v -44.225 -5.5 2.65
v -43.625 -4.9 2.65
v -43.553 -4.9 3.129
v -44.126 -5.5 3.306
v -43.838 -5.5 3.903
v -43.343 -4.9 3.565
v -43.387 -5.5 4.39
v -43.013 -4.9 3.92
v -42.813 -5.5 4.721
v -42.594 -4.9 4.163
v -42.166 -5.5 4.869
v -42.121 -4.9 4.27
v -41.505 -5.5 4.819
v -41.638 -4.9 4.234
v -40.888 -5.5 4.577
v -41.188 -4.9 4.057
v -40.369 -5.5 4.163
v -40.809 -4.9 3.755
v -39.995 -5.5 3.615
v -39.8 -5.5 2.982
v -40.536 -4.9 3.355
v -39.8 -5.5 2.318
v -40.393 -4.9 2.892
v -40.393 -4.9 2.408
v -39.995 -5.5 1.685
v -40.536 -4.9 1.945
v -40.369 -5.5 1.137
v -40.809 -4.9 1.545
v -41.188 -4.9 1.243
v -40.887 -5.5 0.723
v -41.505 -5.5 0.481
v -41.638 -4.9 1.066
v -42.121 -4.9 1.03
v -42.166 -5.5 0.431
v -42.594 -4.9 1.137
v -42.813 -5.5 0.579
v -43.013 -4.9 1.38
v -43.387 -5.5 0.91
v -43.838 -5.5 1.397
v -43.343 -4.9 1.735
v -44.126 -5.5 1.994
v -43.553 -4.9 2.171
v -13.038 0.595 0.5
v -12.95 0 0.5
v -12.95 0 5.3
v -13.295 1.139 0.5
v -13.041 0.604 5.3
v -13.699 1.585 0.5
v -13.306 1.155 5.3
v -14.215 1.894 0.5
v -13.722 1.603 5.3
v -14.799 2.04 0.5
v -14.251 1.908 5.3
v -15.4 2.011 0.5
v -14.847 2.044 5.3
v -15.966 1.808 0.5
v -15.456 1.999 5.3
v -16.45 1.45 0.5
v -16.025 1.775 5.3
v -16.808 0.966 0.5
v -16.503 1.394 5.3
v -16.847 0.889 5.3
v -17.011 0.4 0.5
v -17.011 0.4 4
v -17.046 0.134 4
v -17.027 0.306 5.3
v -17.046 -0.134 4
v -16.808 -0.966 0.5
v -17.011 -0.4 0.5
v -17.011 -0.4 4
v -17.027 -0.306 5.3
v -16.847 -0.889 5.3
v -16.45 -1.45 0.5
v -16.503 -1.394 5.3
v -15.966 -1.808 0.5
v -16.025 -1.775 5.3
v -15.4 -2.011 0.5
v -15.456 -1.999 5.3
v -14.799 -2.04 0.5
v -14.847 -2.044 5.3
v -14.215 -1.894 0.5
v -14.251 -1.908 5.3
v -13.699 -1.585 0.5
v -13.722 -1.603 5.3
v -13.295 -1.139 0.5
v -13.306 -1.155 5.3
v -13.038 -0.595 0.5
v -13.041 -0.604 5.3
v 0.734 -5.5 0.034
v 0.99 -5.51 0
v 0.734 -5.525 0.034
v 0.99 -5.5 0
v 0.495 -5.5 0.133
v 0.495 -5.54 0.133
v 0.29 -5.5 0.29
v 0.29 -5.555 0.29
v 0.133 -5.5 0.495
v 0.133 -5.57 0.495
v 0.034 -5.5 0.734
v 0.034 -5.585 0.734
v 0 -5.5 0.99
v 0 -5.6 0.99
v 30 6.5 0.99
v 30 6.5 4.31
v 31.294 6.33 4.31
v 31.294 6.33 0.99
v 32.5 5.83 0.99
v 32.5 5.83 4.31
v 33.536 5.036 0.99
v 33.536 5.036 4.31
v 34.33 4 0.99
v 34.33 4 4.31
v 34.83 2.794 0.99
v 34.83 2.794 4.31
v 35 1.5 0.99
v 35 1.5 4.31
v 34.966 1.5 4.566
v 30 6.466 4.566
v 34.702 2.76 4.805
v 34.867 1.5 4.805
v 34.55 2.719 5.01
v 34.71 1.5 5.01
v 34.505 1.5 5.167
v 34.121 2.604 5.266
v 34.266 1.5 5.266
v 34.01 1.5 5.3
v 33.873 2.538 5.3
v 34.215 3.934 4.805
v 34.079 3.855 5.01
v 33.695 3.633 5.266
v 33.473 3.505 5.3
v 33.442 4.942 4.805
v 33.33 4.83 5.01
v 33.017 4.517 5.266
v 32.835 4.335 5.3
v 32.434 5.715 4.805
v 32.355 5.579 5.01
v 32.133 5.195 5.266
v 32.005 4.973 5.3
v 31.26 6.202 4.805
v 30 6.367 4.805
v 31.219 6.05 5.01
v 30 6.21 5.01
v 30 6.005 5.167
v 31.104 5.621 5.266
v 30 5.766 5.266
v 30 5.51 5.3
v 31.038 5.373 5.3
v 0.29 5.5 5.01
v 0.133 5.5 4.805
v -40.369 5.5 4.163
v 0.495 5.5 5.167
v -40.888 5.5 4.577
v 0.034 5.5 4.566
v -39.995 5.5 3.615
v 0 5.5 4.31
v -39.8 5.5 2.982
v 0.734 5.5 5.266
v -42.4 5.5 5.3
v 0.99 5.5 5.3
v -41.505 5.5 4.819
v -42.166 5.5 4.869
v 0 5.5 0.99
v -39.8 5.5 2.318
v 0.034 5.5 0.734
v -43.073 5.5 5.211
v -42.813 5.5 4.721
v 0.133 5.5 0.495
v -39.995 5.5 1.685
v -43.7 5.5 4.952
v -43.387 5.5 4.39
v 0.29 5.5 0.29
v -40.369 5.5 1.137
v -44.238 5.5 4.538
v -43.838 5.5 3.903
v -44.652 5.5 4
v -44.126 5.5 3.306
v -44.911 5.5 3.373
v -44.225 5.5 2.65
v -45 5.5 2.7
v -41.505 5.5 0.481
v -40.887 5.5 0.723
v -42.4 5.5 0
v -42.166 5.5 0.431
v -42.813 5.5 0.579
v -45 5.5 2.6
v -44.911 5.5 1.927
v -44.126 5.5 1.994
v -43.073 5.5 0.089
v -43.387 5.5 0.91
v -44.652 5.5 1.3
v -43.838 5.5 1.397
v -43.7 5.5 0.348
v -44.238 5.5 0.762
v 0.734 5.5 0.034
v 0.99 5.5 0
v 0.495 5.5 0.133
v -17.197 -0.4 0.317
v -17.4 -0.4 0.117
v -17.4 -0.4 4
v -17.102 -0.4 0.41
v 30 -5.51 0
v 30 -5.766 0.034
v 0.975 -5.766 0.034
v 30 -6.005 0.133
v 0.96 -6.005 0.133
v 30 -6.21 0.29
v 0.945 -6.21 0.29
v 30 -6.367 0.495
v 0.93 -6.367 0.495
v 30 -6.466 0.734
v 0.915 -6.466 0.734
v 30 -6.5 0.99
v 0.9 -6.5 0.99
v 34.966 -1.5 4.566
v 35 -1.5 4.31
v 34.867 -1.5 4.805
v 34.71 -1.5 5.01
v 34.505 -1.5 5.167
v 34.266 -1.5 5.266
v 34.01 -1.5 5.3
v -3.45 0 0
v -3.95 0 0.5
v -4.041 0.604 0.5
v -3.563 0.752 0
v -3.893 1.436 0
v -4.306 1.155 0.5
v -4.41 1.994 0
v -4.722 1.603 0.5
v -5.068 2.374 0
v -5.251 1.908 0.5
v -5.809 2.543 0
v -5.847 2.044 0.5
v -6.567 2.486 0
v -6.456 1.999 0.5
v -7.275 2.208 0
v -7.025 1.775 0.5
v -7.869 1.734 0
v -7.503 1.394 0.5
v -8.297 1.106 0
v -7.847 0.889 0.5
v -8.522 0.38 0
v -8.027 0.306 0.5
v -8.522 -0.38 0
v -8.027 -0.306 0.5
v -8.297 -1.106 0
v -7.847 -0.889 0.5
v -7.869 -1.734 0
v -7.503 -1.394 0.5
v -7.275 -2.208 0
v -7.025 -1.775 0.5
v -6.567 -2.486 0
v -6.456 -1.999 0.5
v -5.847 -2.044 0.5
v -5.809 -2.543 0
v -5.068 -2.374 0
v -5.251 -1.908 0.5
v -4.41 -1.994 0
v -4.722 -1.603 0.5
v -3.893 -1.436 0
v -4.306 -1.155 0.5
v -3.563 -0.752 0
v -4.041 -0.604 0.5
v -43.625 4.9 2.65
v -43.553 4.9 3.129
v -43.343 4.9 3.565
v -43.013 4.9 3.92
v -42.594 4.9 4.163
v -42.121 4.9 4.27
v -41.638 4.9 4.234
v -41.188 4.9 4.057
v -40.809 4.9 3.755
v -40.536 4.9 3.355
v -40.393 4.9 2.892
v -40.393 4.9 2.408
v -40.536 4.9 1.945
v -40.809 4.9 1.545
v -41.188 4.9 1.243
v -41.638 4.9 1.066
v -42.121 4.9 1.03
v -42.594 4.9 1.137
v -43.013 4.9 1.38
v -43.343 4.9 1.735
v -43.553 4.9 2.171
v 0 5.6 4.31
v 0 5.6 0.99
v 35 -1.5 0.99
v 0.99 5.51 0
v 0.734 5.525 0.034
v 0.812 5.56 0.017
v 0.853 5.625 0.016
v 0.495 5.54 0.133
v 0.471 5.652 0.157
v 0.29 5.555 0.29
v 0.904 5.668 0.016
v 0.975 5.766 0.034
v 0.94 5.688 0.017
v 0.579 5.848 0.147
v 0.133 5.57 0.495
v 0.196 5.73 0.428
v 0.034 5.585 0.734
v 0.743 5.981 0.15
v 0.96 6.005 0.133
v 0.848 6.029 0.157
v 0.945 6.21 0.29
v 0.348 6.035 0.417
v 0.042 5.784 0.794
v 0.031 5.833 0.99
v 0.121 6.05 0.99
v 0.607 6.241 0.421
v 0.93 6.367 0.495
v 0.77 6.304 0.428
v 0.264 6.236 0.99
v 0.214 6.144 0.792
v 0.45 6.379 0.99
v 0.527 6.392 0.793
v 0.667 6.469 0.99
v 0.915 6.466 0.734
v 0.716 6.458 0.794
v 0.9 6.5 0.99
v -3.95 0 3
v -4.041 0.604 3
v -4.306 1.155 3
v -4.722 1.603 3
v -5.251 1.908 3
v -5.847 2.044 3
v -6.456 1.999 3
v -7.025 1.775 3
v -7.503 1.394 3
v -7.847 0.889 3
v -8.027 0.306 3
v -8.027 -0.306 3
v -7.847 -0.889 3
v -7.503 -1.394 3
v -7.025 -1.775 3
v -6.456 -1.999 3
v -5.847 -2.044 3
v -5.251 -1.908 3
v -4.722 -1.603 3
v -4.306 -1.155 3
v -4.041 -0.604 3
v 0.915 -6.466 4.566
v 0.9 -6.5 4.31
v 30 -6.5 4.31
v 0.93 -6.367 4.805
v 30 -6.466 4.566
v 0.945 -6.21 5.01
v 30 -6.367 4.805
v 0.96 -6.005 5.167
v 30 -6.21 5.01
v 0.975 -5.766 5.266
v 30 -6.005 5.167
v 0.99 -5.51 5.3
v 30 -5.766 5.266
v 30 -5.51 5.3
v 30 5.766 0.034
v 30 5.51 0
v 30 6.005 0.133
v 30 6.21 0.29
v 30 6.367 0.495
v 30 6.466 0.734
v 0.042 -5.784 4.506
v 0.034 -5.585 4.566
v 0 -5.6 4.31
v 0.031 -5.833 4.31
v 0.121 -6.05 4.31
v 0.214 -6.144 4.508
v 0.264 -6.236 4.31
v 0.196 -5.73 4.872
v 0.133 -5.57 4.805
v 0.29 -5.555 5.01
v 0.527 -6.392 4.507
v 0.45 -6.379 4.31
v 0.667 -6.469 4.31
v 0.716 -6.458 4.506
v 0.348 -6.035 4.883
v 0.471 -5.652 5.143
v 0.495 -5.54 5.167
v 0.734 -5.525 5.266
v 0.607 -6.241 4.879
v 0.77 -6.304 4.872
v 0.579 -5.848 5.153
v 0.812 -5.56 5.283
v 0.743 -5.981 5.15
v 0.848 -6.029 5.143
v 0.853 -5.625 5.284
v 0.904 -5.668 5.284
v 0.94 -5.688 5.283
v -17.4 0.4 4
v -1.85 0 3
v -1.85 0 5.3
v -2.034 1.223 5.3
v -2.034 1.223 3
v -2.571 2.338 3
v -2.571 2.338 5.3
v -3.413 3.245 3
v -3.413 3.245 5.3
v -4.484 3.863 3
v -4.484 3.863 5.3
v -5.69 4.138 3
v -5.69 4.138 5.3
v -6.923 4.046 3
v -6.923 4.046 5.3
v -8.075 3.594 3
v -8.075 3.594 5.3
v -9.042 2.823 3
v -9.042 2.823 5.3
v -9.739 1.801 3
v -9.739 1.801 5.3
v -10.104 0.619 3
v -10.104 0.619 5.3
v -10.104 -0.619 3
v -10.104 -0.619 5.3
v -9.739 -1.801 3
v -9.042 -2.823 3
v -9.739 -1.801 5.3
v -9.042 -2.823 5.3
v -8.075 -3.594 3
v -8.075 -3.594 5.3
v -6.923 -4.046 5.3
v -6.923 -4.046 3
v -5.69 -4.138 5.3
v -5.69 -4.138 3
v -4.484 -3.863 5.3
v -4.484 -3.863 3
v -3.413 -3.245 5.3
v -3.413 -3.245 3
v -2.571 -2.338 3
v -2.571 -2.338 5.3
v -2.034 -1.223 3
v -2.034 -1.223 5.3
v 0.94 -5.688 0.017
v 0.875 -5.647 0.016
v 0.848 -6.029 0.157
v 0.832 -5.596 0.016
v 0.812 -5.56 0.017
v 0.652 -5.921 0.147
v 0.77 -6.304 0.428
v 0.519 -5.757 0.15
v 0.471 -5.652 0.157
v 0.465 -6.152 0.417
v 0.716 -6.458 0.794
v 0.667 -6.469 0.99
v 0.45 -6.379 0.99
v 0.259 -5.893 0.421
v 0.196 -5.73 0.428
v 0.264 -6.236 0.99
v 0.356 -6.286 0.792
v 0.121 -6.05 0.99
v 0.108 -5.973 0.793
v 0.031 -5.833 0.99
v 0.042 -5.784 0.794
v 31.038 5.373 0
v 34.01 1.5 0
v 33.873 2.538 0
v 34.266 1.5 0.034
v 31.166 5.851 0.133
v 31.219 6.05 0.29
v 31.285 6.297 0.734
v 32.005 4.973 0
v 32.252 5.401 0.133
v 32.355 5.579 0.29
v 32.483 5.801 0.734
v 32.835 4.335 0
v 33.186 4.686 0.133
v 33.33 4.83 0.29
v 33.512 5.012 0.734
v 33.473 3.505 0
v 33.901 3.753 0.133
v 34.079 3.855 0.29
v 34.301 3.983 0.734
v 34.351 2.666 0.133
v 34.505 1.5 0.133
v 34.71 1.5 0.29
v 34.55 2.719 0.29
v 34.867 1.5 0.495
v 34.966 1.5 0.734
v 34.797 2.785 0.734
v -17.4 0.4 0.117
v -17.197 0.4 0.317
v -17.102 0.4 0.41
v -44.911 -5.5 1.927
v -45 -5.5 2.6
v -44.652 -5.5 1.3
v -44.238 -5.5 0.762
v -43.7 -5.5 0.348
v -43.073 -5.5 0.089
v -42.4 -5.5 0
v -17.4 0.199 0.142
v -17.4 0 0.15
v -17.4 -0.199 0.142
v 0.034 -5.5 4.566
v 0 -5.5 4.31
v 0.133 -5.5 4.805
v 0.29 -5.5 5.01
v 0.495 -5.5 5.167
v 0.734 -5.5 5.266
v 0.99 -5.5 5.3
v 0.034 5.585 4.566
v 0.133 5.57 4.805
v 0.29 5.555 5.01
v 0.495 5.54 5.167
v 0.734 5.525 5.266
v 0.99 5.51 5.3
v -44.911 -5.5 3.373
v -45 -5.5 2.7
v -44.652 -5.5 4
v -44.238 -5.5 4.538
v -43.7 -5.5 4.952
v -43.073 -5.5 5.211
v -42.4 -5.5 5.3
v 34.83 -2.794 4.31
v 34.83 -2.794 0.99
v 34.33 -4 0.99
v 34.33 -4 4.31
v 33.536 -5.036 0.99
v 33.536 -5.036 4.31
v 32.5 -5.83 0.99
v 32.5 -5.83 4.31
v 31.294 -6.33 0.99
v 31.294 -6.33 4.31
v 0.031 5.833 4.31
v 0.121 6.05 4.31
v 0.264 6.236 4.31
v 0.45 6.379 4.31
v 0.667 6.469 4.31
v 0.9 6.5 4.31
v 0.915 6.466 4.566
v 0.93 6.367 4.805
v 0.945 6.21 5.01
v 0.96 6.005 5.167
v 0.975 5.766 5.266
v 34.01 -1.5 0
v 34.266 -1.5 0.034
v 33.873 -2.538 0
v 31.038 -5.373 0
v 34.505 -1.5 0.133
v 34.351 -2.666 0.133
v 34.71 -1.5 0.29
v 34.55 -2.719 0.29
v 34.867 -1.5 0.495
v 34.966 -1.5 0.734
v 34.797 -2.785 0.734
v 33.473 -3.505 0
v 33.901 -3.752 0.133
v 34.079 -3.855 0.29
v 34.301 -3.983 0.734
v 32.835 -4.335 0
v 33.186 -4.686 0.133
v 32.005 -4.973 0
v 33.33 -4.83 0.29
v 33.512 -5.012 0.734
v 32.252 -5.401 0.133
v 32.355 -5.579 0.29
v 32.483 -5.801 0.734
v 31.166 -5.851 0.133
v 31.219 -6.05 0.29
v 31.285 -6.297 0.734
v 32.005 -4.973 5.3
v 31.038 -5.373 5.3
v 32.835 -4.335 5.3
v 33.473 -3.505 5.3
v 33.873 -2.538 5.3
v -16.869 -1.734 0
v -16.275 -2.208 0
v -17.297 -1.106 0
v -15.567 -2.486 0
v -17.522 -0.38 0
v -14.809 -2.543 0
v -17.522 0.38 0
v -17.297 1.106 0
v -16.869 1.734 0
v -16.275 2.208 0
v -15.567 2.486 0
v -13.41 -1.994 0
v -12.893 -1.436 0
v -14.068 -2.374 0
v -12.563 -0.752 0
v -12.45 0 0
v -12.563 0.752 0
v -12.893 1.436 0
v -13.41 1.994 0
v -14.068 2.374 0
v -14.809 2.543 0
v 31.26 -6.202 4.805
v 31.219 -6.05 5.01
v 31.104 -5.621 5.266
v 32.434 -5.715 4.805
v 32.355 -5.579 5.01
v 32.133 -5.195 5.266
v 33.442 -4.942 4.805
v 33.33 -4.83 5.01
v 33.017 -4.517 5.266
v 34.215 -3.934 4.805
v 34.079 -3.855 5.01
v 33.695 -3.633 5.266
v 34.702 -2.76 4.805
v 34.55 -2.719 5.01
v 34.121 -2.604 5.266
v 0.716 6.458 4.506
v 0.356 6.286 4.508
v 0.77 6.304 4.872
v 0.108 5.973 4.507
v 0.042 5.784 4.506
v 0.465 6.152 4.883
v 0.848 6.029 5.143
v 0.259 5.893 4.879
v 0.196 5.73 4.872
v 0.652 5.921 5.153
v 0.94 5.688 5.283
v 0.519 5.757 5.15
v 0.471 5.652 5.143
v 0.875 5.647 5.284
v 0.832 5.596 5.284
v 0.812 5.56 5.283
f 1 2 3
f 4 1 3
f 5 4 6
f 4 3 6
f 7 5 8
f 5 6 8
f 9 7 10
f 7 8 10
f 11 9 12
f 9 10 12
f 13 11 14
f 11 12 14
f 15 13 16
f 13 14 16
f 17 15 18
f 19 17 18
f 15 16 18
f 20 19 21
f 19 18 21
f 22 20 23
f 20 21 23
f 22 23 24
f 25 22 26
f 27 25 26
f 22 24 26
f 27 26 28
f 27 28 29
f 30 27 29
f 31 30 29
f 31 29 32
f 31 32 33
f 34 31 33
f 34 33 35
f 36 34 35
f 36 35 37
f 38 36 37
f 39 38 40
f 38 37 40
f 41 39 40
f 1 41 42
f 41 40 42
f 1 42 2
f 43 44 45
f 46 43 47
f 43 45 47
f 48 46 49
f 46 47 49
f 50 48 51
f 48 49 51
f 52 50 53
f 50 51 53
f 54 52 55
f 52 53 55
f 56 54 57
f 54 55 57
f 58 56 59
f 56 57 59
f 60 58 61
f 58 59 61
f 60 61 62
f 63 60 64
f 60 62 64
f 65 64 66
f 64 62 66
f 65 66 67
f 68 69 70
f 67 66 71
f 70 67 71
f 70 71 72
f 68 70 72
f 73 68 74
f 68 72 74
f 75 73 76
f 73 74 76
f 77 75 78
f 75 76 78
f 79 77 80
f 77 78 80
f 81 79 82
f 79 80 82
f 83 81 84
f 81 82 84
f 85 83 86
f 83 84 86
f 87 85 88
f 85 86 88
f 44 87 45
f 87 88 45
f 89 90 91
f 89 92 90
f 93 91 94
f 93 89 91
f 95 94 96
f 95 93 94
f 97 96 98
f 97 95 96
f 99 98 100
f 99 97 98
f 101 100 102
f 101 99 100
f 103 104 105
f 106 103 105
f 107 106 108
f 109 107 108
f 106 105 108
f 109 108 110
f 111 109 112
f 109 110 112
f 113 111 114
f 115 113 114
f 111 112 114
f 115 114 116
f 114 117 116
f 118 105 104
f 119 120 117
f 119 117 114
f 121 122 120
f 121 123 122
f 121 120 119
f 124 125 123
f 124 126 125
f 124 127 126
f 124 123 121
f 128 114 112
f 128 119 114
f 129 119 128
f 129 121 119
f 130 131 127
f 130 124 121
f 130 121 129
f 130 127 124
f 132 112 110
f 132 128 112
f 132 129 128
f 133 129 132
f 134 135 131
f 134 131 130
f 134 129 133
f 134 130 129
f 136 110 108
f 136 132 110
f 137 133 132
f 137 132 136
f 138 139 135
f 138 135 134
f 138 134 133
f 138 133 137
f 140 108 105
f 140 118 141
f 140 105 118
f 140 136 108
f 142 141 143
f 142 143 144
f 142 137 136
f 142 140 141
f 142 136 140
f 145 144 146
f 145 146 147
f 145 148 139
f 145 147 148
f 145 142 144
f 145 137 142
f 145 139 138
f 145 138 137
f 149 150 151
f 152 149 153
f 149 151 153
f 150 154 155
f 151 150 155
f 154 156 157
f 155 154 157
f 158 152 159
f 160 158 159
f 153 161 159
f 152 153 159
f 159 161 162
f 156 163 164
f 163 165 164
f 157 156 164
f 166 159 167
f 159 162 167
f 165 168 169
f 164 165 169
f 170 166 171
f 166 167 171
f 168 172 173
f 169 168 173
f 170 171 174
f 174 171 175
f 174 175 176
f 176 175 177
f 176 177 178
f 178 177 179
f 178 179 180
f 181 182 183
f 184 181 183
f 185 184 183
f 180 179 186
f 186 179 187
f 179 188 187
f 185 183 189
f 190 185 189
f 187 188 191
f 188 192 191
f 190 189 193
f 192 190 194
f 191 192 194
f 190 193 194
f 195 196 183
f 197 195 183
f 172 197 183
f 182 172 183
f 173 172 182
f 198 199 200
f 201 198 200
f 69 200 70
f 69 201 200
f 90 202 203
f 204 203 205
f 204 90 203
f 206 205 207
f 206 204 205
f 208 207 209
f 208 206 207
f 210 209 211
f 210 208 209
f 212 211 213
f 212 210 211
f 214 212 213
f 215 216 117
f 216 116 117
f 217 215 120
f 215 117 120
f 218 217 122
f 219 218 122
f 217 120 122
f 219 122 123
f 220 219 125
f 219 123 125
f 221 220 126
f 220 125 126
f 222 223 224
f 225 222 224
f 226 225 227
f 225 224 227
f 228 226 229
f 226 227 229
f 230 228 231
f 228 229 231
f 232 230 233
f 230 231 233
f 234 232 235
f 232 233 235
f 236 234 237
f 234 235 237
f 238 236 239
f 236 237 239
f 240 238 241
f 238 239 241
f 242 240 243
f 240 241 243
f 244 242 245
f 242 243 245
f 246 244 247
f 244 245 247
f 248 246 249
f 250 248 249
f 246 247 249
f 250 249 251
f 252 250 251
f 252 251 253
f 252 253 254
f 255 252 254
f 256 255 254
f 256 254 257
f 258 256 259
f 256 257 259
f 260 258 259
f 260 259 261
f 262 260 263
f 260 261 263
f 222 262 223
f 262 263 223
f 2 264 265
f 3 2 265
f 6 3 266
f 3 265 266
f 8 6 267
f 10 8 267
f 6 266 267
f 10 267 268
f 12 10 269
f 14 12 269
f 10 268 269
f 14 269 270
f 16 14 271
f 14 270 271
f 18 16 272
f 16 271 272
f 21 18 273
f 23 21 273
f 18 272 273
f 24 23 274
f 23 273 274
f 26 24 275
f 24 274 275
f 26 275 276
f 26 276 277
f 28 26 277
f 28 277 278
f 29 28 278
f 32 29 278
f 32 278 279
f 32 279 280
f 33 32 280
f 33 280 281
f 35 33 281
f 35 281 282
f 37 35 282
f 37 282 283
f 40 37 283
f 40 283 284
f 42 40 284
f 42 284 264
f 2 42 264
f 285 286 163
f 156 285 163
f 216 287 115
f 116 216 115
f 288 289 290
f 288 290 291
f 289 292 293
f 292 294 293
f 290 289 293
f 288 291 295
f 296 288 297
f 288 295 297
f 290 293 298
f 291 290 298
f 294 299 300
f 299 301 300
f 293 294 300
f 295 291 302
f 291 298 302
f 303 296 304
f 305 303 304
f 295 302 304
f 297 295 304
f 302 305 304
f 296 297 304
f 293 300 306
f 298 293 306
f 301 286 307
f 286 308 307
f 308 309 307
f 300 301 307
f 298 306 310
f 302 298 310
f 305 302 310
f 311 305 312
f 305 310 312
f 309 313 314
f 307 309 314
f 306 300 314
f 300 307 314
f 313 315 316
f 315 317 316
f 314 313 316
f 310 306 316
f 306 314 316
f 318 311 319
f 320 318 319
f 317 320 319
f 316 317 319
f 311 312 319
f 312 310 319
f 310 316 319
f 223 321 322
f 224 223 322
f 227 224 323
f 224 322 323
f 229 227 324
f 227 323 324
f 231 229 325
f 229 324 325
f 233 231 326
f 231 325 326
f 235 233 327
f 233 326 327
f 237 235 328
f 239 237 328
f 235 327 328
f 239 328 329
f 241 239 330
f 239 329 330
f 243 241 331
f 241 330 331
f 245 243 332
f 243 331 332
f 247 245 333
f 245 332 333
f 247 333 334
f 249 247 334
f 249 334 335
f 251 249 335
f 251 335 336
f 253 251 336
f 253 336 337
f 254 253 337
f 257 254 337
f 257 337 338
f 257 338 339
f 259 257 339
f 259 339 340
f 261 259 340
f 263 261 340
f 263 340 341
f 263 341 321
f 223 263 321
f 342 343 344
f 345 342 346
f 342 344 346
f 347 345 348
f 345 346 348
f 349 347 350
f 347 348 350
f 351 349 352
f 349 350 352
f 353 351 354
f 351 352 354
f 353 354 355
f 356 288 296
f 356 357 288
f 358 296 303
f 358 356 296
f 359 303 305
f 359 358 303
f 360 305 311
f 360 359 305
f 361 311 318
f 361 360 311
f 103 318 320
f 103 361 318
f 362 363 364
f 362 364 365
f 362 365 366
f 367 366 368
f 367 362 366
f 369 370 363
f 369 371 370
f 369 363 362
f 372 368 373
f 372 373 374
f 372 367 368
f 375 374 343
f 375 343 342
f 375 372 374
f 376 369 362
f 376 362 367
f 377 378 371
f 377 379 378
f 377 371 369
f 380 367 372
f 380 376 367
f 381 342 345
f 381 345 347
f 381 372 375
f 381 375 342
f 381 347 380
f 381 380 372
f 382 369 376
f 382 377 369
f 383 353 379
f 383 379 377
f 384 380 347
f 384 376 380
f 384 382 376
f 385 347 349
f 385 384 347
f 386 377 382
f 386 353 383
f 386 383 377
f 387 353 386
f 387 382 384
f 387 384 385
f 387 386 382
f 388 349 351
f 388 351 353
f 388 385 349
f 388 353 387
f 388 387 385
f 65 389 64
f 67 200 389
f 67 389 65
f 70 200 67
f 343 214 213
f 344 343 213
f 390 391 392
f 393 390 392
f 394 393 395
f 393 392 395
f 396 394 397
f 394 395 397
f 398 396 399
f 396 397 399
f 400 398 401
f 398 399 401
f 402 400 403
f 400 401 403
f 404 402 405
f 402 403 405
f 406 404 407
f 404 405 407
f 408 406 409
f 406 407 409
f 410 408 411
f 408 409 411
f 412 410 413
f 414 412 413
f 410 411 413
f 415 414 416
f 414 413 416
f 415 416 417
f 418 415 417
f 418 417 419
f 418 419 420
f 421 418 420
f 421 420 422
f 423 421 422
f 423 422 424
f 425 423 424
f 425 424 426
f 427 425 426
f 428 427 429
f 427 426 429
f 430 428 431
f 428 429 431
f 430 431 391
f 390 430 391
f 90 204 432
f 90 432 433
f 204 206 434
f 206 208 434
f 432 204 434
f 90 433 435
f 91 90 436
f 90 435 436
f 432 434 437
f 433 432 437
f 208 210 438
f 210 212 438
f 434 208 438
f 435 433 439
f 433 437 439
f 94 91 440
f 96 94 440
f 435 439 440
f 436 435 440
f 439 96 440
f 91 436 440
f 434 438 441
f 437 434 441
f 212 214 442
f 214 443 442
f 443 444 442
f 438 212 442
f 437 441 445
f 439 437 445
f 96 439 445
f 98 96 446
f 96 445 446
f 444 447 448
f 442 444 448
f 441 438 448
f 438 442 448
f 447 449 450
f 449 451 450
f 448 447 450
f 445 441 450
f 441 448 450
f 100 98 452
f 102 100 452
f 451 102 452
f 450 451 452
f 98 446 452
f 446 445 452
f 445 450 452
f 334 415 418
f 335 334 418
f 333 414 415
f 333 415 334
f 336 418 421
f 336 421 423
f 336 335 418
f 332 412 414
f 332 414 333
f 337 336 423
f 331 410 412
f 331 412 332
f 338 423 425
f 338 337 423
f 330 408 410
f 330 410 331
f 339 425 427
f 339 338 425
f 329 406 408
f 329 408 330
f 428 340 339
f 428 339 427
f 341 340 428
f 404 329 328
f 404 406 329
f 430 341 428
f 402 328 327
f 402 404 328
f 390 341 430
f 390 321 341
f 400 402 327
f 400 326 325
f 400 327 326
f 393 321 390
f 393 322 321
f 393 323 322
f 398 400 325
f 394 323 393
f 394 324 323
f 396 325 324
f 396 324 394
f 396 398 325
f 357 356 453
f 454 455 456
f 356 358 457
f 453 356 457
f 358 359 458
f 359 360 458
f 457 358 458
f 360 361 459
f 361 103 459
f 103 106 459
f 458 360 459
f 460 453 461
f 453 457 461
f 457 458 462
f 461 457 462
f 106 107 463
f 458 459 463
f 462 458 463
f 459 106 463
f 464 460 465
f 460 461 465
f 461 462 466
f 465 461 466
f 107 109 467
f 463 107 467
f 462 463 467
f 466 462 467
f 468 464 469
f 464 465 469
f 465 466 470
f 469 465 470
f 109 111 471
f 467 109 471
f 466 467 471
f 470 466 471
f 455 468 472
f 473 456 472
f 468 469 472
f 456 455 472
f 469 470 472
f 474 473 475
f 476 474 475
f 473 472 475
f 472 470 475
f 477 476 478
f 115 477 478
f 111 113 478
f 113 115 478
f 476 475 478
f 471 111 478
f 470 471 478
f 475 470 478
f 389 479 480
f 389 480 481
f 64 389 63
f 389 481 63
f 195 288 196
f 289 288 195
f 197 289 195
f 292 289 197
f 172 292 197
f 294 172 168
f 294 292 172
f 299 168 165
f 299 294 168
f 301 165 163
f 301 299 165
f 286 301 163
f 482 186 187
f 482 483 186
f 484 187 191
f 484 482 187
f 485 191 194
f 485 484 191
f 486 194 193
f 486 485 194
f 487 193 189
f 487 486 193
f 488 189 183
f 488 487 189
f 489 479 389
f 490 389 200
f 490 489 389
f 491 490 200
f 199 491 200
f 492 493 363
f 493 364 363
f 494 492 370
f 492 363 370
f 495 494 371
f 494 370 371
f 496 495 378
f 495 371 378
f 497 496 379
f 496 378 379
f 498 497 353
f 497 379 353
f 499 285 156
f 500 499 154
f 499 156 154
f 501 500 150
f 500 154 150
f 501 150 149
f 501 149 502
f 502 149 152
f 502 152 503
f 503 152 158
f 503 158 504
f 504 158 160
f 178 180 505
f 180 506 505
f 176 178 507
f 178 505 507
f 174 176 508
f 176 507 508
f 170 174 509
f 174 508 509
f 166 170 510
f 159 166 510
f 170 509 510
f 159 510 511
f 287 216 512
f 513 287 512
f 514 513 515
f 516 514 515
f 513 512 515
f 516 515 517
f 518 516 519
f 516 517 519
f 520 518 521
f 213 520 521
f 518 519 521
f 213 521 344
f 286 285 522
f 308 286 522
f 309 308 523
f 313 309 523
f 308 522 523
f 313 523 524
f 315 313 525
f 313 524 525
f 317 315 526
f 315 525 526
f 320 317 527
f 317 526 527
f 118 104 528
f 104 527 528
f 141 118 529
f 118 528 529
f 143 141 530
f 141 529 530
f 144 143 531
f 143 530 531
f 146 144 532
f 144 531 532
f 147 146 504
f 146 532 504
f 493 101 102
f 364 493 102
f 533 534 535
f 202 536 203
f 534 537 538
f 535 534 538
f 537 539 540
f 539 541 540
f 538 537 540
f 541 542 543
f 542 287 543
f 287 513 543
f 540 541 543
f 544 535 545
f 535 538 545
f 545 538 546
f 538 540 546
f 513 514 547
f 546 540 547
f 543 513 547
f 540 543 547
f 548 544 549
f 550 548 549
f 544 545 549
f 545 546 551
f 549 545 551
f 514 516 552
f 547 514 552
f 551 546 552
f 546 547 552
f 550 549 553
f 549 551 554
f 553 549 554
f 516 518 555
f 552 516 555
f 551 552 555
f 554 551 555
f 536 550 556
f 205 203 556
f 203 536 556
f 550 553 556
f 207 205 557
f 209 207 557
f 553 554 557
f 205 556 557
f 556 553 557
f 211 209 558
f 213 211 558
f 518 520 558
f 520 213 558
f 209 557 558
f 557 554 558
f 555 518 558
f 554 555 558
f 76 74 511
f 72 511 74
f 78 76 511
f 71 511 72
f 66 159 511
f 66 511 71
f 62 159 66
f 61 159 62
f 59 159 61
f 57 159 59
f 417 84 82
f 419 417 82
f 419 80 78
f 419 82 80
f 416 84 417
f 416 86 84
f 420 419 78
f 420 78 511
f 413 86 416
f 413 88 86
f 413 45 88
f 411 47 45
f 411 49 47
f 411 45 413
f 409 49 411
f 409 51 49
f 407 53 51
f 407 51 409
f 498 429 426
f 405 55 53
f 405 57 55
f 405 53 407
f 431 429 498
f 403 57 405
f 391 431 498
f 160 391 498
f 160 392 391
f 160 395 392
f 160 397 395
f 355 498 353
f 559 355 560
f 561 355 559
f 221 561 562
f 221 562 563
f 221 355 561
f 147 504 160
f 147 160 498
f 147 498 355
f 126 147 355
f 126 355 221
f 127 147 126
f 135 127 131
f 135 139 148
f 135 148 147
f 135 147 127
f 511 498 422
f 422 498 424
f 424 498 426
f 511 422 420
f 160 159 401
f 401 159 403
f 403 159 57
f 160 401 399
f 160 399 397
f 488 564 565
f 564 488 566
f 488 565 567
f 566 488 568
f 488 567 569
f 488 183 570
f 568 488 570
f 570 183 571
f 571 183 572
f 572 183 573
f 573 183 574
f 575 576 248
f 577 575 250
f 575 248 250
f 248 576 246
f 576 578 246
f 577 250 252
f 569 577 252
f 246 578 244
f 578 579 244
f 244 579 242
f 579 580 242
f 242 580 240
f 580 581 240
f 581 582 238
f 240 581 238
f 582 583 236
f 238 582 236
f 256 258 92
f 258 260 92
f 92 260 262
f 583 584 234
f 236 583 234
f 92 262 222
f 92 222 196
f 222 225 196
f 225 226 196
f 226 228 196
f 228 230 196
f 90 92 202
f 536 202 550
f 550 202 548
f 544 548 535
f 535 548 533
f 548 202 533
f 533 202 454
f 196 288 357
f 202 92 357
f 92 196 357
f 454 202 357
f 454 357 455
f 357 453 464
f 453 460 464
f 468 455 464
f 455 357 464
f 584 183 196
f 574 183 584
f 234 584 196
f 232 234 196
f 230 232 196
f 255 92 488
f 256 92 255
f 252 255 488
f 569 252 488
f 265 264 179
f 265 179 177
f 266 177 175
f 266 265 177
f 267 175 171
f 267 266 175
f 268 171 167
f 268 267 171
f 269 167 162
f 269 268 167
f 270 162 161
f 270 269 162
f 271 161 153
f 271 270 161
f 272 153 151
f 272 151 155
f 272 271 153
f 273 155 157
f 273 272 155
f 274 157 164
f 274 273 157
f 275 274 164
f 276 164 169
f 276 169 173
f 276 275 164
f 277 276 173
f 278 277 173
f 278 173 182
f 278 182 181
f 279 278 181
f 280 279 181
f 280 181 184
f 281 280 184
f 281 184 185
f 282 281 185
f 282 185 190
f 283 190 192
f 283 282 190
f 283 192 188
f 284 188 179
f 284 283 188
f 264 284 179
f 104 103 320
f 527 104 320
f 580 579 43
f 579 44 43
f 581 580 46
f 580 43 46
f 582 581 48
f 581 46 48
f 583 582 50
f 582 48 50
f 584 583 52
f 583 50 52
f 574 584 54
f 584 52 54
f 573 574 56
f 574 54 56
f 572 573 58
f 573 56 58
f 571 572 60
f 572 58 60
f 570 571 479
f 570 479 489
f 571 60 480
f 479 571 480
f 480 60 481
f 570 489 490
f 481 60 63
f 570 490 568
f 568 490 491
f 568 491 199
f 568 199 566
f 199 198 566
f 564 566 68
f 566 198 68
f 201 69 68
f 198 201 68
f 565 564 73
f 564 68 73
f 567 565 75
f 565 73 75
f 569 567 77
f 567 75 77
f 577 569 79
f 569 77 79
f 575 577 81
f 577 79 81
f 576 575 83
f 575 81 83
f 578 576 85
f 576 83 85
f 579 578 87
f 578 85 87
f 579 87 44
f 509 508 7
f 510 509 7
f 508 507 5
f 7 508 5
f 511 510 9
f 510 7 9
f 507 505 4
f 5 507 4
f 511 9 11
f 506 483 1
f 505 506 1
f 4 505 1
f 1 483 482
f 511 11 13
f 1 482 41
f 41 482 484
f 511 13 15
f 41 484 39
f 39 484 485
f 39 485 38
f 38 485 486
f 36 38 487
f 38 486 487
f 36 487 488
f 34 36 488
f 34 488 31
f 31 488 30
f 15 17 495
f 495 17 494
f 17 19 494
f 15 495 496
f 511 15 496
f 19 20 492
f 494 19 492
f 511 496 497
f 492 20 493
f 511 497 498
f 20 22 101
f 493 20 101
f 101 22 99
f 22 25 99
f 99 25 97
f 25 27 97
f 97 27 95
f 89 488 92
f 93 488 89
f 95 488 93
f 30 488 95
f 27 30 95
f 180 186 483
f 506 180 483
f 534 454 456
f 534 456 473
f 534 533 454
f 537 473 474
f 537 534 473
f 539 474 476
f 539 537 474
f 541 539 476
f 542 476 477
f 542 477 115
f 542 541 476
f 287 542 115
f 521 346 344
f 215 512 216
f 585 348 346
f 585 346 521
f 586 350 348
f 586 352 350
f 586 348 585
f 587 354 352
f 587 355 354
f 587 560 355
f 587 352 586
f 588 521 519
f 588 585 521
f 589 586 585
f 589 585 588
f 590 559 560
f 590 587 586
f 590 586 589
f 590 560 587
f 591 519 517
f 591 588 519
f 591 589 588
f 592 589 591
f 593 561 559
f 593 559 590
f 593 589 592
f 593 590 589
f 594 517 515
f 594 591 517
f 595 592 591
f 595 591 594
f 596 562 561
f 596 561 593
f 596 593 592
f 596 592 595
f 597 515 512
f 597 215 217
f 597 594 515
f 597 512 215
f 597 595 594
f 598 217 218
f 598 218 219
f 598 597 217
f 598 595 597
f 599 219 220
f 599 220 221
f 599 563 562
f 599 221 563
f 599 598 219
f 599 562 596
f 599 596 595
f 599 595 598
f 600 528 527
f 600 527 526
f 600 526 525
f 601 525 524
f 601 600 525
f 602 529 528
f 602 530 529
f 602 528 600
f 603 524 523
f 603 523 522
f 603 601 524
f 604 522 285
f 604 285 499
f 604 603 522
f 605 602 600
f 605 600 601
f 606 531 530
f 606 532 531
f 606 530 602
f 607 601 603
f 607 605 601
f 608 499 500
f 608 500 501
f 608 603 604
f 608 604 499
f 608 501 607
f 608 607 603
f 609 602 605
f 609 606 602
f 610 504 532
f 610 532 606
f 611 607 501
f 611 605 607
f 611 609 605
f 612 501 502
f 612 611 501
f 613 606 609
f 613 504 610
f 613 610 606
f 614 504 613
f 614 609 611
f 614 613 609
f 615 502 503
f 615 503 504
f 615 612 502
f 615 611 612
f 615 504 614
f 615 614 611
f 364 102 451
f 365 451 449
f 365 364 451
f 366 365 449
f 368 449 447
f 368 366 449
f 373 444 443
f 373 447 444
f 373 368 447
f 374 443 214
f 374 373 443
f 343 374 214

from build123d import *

# Parameters (mm, degrees)
PAD_DEPTH       = 5.3
SKETCH001_R     = 4.15
POCKET_DEPTH    = 2.3
SKETCH002_R     = 2.05
POCKET001_DEPTH = 3.001
FILLET_R        = 2.6
SKETCH003_R     = 1.625
POCKET002_DEPTH = 12.001
FILLET001_R     = 0.9
FILLET002_R     = 5
SKETCH004_R     = 2.05
POCKET003_DEPTH = 5.301
FILLET003_R     = 0.99
CHAMFER_SIZE    = 0.5
SKETCH005_W     = 0.5
SKETCH005_H     = 0.8
POCKET004_DEPTH = 4
CHAMFER001_SIZE = 0.6


with BuildPart() as part:
    # Sketch → Pad (new body)
    with BuildSketch(Plane.XY):
        Polygon((0, 5.5), (-45, 5.5), (-45, -5.5), (0, -5.5), (0, -6.5), (35, -6.5), (35, 6.5), (0, 6.5), align=None)
    extrude(amount=PAD_DEPTH)

    # Sketch001 (on Face10 of Pad) → Pocket (cut)
    with BuildSketch(Plane.XY.offset(5.3)):
        with Locations((-6, 0)):
            Circle(SKETCH001_R)
    extrude(amount=-POCKET_DEPTH, mode=Mode.SUBTRACT)

    # Sketch002 (on Face12 of Pocket) → Pocket001 (cut, through all)
    with BuildSketch(Plane.XY.offset(3)):
        with Locations((-6, 0)):
            Circle(SKETCH002_R)
    extrude(amount=-POCKET001_DEPTH, mode=Mode.SUBTRACT)

    # Fillet
    fillet_edges = [part.edges().sort_by_distance(p)[0] for p in [
        (-45, 0, 5.3),
        (-45, 0, 0),
    ]]
    fillet(fillet_edges, radius=FILLET_R)

    # Sketch003 (on Face1 of Fillet) → Pocket002 (cut, through all)
    with BuildSketch(Plane(origin=(0, 5.5, 0), x_dir=(-1, 0, 0), z_dir=(0, 1, 0))):
        with Locations((42, 2.65)):
            Circle(SKETCH003_R)
    extrude(amount=-POCKET002_DEPTH, mode=Mode.SUBTRACT)

    # Fillet001
    fillet001_edges = [part.edges().sort_by_distance(p)[0] for p in [
        (0, 6.5, 2.65),
        (0, -6.5, 2.65),
    ]]
    fillet(fillet001_edges, radius=FILLET001_R)

    # Fillet002
    fillet002_edges = [part.edges().sort_by_distance(p)[0] for p in [
        (35, 6.5, 2.65),
        (35, -6.5, 2.65),
    ]]
    fillet(fillet002_edges, radius=FILLET002_R)

    # Sketch004 (on Face15 of Fillet002) → Pocket003 (cut, through all)
    with BuildSketch(Plane.XY.offset(5.3)):
        with Locations((-15, 0)):
            Circle(SKETCH004_R)
    extrude(amount=-POCKET003_DEPTH, mode=Mode.SUBTRACT)

    # Fillet003
    fillet003_edges = [part.edges().sort_by_distance(p)[0] for p in [
        (0.263604, -6.236396, 5.3),
        (15.45, -6.5, 5.3),
        (33.535534, -5.035534, 5.3),
        (35, 0, 5.3),
        (33.535534, 5.035534, 5.3),
        (15.45, 6.5, 5.3),
        (0.263604, 6.236396, 5.3),
        (0.263604, 6.236396, 0),
        (15.45, 6.5, 0),
        (33.535534, 5.035534, 0),
        (35, 0, 0),
        (33.535534, -5.035534, 0),
        (15.45, -6.5, 0),
    ]]
    fillet(fillet003_edges, radius=FILLET003_R)

    # Chamfer
    chamfer_edges = [part.edges().sort_by_distance(p)[0] for p in [
        (-17.05, 0, 0),
        (-8.05, 0, 0),
    ]]
    chamfer(chamfer_edges, length=CHAMFER_SIZE)

    # Sketch005 (on Face1 of Chamfer) → Pocket004 (cut)
    with BuildSketch(Plane(origin=(0, 0, 0), x_dir=(1, 0, 0), z_dir=(0, 0, -1))):
        with Locations((-17.15, 0)):
            Rectangle(SKETCH005_W, SKETCH005_H)
    extrude(amount=-POCKET004_DEPTH, mode=Mode.SUBTRACT)

    # Chamfer001
    chamfer001_edges = [part.edges().sort_by_distance(p)[0] for p in [
        (-40.375, 5.5, 2.65),
        (-40.375, -5.5, 2.65),
    ]]
    chamfer(chamfer001_edges, length=CHAMFER001_SIZE)


solid = part.part
